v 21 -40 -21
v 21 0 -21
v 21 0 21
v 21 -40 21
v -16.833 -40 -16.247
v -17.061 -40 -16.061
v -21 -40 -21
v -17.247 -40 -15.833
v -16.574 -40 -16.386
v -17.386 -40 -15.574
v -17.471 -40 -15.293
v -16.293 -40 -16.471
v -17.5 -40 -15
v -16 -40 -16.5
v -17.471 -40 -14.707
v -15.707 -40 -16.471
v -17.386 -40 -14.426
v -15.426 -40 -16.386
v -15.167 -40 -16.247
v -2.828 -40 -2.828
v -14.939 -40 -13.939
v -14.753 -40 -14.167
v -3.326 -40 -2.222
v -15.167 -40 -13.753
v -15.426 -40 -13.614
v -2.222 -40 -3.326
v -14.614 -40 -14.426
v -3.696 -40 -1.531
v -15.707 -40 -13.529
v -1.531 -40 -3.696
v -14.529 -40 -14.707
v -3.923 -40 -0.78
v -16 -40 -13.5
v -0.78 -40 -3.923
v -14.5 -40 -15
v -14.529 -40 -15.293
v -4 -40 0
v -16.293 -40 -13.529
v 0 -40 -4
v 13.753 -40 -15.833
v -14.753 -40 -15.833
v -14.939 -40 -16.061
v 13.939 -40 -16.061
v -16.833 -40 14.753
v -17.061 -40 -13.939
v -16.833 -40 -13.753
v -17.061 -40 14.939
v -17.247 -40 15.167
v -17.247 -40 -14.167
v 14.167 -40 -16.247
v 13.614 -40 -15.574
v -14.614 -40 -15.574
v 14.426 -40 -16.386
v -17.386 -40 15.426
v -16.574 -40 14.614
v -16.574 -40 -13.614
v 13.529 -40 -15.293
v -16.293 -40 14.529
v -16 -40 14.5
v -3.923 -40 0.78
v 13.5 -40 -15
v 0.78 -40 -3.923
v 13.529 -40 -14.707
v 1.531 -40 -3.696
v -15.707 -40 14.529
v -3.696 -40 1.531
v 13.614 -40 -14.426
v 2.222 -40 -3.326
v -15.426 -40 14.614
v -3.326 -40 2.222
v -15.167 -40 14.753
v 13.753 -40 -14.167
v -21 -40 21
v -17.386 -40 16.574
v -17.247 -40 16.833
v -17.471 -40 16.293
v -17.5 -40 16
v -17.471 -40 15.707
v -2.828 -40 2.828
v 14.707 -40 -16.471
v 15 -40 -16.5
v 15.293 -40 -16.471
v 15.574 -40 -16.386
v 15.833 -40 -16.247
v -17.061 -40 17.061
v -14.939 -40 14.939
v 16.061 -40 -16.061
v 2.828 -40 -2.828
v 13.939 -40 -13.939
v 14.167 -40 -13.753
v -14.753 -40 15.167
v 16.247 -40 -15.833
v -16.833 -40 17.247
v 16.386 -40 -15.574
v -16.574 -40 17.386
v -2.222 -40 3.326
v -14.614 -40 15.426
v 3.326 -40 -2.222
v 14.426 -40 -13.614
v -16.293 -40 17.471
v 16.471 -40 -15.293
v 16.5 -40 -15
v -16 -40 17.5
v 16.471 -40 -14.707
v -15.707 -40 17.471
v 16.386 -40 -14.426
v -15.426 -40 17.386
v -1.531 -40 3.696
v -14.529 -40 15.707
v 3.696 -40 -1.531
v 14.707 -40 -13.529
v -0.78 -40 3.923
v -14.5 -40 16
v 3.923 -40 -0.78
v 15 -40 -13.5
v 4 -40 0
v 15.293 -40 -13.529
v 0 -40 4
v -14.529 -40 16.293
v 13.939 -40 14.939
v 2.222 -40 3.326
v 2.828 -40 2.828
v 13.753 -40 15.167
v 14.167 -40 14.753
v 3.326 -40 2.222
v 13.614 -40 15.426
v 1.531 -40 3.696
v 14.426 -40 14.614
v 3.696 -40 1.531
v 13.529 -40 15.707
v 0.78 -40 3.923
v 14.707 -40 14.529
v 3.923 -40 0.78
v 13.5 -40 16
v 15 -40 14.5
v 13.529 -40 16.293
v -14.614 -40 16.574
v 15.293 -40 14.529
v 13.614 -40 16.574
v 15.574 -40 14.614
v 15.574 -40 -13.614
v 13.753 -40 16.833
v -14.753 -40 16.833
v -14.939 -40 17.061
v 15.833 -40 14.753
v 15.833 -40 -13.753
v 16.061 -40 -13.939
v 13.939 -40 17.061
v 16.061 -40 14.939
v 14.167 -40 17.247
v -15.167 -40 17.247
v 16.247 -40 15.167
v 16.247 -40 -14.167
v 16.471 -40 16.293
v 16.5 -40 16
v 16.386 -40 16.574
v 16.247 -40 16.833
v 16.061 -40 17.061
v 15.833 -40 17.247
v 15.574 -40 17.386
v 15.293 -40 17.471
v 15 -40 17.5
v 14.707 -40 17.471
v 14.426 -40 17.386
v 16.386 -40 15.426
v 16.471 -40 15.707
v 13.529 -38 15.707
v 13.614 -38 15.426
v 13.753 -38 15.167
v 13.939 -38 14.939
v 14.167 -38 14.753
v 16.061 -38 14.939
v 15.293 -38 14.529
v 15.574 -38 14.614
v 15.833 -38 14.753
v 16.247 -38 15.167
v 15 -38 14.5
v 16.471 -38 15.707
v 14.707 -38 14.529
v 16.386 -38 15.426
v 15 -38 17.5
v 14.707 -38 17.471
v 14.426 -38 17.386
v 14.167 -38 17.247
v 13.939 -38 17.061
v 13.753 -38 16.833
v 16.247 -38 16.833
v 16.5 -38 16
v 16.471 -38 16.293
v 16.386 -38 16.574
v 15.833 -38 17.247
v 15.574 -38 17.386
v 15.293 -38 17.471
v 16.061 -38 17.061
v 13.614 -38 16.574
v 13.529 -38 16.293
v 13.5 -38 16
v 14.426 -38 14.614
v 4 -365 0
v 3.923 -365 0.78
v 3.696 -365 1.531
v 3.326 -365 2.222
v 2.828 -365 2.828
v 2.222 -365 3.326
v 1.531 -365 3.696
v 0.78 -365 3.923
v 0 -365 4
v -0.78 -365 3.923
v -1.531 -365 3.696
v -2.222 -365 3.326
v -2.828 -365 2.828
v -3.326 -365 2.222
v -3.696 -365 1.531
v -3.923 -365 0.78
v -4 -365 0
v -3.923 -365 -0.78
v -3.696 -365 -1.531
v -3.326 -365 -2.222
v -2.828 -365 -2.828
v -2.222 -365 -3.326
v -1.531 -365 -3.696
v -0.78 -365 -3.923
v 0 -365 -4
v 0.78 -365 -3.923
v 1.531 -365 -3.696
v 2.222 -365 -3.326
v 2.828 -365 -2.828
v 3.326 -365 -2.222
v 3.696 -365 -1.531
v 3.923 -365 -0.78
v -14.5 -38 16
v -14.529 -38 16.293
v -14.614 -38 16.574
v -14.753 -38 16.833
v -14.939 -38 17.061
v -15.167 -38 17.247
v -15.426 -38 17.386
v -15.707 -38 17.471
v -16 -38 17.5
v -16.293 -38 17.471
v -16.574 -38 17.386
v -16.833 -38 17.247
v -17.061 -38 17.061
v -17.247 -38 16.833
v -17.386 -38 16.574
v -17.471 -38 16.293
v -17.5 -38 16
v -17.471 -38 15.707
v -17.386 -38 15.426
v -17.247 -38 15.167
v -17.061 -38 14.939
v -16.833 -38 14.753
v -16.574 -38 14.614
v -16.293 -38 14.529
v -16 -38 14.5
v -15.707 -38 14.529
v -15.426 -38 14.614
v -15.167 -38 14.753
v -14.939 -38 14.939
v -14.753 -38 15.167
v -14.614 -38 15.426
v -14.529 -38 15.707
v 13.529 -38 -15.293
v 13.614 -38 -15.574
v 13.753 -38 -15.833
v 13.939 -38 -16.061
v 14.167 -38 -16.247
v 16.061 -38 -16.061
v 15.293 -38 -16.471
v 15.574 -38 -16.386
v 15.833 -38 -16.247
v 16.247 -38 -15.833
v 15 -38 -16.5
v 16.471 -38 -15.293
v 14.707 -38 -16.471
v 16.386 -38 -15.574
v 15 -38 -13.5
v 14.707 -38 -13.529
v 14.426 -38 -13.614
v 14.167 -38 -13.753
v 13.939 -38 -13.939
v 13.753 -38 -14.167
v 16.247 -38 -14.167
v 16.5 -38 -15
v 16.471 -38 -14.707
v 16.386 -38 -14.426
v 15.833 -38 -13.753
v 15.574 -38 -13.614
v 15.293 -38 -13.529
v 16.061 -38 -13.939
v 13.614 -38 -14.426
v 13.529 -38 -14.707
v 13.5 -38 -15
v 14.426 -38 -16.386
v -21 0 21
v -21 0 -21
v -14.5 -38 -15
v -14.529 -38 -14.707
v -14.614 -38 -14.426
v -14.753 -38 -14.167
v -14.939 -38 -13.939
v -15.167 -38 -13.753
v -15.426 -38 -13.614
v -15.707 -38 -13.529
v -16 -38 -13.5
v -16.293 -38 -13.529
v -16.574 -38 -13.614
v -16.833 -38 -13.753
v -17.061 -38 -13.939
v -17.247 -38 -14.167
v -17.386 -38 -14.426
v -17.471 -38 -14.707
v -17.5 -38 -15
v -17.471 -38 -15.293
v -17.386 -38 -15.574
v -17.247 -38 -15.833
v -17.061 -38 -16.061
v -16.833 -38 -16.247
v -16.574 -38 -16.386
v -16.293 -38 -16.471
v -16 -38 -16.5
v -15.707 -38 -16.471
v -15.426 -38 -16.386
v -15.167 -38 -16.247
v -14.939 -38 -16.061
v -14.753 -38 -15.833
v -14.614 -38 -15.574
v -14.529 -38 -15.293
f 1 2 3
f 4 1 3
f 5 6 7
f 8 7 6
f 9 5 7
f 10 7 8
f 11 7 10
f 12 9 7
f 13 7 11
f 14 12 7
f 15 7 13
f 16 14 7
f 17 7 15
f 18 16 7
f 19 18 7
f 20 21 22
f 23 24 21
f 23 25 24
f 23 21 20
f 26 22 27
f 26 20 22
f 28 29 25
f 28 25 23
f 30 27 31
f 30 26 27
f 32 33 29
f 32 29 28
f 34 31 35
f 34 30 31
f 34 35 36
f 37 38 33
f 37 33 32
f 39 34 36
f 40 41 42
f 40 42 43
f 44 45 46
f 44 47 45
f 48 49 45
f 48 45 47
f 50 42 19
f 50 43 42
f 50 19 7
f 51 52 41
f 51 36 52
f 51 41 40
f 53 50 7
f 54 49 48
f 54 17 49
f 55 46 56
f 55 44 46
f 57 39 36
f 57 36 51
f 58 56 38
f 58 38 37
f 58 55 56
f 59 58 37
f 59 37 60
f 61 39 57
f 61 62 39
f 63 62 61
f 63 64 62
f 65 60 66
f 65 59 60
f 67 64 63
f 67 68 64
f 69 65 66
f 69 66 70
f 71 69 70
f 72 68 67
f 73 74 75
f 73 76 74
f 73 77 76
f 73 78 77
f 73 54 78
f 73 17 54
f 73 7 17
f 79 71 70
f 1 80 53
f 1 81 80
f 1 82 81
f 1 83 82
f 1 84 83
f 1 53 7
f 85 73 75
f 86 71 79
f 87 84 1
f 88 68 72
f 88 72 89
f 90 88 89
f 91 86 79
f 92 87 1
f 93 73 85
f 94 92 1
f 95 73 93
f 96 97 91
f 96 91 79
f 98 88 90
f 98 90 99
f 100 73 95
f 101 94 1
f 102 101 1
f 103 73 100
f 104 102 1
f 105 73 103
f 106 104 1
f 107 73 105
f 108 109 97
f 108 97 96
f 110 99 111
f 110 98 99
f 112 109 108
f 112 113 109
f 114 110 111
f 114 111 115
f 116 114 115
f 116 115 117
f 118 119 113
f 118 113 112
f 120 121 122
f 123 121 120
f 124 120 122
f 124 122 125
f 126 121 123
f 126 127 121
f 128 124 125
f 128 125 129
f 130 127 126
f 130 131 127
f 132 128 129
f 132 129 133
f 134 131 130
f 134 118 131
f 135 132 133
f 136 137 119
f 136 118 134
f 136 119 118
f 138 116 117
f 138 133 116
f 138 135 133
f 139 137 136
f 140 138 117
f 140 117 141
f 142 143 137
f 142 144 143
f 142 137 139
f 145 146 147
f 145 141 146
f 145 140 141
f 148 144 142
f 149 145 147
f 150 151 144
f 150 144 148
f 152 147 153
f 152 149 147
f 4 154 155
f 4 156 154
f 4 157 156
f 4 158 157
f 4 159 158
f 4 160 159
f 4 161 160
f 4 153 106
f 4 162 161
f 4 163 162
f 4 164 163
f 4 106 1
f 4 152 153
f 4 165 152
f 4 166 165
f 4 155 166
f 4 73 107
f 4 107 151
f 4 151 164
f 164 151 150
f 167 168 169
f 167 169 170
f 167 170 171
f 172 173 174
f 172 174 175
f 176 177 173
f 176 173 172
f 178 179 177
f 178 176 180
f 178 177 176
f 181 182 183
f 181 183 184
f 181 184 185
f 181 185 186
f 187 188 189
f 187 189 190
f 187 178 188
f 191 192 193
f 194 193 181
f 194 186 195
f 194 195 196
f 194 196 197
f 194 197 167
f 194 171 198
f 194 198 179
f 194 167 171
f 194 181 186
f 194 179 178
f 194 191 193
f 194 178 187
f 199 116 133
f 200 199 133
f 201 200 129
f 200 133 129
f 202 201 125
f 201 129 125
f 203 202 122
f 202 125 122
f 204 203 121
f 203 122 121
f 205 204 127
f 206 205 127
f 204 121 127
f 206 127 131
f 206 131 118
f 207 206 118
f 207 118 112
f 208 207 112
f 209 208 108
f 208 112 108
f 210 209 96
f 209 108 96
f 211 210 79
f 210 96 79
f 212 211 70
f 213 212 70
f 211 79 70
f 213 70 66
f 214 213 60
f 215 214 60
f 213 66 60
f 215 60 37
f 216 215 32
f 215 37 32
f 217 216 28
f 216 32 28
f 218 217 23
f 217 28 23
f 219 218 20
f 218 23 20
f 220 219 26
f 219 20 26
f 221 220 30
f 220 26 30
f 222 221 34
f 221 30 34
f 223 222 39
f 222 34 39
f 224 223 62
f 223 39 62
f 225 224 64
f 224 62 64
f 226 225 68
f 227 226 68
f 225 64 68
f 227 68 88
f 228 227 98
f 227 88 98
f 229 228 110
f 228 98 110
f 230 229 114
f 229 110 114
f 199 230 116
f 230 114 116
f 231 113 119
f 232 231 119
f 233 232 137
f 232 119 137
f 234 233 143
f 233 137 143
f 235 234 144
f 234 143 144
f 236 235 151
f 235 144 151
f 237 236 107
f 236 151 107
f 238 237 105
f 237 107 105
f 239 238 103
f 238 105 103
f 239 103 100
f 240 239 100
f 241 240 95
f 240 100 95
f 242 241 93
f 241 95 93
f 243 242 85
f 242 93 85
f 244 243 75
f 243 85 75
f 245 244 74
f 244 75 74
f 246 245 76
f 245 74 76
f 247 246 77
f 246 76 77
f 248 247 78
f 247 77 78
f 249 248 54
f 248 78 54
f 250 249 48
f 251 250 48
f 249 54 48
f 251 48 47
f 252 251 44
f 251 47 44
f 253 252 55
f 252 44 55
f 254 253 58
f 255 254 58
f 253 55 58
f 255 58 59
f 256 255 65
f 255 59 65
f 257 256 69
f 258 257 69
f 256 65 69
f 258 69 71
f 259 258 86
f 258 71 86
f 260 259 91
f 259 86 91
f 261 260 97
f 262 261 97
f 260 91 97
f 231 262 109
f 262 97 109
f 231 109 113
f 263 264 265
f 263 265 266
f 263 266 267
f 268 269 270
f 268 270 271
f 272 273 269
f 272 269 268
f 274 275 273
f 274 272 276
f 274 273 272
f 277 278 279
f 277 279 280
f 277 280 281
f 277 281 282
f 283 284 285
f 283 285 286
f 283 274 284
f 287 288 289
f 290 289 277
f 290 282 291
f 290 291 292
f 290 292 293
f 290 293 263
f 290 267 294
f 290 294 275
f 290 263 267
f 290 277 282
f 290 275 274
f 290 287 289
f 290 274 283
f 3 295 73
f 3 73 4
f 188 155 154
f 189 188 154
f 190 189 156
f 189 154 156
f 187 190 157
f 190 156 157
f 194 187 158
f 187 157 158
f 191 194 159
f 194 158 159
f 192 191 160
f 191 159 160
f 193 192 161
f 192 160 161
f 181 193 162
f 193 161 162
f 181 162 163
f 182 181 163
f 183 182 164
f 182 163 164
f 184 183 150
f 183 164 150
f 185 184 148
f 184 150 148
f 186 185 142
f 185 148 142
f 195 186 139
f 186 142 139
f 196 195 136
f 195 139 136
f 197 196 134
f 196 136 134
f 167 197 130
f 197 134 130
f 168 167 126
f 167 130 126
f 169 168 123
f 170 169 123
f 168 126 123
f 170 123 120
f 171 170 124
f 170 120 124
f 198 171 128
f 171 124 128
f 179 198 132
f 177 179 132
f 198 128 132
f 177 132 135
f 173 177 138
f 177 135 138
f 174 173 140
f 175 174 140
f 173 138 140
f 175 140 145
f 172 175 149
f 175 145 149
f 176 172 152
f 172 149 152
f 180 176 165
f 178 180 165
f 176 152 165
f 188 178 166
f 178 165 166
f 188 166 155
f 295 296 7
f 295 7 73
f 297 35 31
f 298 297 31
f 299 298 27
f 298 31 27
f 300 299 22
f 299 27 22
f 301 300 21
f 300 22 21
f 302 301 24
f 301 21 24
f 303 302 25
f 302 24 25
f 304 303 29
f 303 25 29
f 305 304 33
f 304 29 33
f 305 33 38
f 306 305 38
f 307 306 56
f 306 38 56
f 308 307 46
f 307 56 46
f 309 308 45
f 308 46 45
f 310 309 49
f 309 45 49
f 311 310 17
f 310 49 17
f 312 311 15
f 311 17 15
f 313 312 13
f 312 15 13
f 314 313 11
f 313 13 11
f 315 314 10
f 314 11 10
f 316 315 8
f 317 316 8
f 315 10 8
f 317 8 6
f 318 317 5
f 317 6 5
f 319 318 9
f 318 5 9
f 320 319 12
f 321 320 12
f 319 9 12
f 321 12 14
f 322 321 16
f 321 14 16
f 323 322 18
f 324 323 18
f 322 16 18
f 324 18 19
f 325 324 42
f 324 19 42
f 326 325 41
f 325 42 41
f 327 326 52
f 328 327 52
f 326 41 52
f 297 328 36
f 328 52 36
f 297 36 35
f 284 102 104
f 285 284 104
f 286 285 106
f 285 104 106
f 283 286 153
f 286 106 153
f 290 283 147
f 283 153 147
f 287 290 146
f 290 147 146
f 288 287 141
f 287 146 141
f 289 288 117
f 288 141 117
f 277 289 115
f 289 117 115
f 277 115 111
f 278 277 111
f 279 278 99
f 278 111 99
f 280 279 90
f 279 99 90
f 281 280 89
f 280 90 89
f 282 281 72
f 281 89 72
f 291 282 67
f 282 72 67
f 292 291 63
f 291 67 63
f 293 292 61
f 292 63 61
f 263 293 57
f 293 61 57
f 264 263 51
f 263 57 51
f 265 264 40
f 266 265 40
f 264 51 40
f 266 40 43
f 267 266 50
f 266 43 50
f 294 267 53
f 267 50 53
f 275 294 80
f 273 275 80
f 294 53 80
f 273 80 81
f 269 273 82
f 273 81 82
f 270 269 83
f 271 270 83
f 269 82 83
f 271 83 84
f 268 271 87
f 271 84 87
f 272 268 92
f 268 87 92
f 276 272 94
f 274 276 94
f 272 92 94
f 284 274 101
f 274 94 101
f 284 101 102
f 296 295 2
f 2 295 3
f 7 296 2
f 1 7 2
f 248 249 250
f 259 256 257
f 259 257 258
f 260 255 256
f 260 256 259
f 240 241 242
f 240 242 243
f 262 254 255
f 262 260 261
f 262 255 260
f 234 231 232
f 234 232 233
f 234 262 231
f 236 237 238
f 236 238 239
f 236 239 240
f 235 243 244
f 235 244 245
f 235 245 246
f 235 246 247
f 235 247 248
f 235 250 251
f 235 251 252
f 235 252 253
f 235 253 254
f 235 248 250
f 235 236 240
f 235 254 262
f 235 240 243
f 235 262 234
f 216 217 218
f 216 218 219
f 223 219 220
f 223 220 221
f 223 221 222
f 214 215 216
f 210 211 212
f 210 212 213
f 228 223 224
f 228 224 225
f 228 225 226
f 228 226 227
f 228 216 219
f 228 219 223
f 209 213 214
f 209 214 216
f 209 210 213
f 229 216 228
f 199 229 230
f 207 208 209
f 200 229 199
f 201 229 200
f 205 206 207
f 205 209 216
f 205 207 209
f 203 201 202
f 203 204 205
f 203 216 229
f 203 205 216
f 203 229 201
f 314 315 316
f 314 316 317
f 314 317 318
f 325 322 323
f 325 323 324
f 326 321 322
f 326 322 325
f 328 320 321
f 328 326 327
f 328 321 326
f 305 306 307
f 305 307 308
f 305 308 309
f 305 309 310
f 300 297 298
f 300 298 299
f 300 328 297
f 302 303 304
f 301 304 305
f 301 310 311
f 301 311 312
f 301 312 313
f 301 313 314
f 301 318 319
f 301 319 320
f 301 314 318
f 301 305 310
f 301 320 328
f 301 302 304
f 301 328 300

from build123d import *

# Parameters (mm, degrees)
F0_W     = 42
F0_H     = 42
F1_DEPTH = 40
F2_R     = 4
F3_DEPTH = 325
F4_R     = 1.5
F5_DEPTH = 2


with BuildPart() as f1:
    # F0 (on Front) → F1 (new body)
    with BuildSketch(Plane.XZ):
        Rectangle(F0_W, F0_H)
    extrude(amount=F1_DEPTH)

    # F2 (on face) → F3 (join)
    with BuildSketch(Plane.XZ.offset(40)):
        Circle(F2_R)
    extrude(amount=F3_DEPTH)

    # F4 (on face) → F5 (cut)
    with BuildSketch(Plane.XZ.offset(40)):
        with Locations((-16, -15)):
            Circle(F4_R)
        with BuildLine():
            ThreePointArc((-17.5, 16), (-16, 14.5), (-14.5, 16))
            ThreePointArc((-14.5, 16), (-16, 17.5), (-17.5, 16))
        make_face()
        with Locations((15, -15)):
            Circle(F4_R)
        with Locations((15, 16)):
            Circle(F4_R)
    extrude(amount=-F5_DEPTH, mode=Mode.SUBTRACT)


solid = f1.part
